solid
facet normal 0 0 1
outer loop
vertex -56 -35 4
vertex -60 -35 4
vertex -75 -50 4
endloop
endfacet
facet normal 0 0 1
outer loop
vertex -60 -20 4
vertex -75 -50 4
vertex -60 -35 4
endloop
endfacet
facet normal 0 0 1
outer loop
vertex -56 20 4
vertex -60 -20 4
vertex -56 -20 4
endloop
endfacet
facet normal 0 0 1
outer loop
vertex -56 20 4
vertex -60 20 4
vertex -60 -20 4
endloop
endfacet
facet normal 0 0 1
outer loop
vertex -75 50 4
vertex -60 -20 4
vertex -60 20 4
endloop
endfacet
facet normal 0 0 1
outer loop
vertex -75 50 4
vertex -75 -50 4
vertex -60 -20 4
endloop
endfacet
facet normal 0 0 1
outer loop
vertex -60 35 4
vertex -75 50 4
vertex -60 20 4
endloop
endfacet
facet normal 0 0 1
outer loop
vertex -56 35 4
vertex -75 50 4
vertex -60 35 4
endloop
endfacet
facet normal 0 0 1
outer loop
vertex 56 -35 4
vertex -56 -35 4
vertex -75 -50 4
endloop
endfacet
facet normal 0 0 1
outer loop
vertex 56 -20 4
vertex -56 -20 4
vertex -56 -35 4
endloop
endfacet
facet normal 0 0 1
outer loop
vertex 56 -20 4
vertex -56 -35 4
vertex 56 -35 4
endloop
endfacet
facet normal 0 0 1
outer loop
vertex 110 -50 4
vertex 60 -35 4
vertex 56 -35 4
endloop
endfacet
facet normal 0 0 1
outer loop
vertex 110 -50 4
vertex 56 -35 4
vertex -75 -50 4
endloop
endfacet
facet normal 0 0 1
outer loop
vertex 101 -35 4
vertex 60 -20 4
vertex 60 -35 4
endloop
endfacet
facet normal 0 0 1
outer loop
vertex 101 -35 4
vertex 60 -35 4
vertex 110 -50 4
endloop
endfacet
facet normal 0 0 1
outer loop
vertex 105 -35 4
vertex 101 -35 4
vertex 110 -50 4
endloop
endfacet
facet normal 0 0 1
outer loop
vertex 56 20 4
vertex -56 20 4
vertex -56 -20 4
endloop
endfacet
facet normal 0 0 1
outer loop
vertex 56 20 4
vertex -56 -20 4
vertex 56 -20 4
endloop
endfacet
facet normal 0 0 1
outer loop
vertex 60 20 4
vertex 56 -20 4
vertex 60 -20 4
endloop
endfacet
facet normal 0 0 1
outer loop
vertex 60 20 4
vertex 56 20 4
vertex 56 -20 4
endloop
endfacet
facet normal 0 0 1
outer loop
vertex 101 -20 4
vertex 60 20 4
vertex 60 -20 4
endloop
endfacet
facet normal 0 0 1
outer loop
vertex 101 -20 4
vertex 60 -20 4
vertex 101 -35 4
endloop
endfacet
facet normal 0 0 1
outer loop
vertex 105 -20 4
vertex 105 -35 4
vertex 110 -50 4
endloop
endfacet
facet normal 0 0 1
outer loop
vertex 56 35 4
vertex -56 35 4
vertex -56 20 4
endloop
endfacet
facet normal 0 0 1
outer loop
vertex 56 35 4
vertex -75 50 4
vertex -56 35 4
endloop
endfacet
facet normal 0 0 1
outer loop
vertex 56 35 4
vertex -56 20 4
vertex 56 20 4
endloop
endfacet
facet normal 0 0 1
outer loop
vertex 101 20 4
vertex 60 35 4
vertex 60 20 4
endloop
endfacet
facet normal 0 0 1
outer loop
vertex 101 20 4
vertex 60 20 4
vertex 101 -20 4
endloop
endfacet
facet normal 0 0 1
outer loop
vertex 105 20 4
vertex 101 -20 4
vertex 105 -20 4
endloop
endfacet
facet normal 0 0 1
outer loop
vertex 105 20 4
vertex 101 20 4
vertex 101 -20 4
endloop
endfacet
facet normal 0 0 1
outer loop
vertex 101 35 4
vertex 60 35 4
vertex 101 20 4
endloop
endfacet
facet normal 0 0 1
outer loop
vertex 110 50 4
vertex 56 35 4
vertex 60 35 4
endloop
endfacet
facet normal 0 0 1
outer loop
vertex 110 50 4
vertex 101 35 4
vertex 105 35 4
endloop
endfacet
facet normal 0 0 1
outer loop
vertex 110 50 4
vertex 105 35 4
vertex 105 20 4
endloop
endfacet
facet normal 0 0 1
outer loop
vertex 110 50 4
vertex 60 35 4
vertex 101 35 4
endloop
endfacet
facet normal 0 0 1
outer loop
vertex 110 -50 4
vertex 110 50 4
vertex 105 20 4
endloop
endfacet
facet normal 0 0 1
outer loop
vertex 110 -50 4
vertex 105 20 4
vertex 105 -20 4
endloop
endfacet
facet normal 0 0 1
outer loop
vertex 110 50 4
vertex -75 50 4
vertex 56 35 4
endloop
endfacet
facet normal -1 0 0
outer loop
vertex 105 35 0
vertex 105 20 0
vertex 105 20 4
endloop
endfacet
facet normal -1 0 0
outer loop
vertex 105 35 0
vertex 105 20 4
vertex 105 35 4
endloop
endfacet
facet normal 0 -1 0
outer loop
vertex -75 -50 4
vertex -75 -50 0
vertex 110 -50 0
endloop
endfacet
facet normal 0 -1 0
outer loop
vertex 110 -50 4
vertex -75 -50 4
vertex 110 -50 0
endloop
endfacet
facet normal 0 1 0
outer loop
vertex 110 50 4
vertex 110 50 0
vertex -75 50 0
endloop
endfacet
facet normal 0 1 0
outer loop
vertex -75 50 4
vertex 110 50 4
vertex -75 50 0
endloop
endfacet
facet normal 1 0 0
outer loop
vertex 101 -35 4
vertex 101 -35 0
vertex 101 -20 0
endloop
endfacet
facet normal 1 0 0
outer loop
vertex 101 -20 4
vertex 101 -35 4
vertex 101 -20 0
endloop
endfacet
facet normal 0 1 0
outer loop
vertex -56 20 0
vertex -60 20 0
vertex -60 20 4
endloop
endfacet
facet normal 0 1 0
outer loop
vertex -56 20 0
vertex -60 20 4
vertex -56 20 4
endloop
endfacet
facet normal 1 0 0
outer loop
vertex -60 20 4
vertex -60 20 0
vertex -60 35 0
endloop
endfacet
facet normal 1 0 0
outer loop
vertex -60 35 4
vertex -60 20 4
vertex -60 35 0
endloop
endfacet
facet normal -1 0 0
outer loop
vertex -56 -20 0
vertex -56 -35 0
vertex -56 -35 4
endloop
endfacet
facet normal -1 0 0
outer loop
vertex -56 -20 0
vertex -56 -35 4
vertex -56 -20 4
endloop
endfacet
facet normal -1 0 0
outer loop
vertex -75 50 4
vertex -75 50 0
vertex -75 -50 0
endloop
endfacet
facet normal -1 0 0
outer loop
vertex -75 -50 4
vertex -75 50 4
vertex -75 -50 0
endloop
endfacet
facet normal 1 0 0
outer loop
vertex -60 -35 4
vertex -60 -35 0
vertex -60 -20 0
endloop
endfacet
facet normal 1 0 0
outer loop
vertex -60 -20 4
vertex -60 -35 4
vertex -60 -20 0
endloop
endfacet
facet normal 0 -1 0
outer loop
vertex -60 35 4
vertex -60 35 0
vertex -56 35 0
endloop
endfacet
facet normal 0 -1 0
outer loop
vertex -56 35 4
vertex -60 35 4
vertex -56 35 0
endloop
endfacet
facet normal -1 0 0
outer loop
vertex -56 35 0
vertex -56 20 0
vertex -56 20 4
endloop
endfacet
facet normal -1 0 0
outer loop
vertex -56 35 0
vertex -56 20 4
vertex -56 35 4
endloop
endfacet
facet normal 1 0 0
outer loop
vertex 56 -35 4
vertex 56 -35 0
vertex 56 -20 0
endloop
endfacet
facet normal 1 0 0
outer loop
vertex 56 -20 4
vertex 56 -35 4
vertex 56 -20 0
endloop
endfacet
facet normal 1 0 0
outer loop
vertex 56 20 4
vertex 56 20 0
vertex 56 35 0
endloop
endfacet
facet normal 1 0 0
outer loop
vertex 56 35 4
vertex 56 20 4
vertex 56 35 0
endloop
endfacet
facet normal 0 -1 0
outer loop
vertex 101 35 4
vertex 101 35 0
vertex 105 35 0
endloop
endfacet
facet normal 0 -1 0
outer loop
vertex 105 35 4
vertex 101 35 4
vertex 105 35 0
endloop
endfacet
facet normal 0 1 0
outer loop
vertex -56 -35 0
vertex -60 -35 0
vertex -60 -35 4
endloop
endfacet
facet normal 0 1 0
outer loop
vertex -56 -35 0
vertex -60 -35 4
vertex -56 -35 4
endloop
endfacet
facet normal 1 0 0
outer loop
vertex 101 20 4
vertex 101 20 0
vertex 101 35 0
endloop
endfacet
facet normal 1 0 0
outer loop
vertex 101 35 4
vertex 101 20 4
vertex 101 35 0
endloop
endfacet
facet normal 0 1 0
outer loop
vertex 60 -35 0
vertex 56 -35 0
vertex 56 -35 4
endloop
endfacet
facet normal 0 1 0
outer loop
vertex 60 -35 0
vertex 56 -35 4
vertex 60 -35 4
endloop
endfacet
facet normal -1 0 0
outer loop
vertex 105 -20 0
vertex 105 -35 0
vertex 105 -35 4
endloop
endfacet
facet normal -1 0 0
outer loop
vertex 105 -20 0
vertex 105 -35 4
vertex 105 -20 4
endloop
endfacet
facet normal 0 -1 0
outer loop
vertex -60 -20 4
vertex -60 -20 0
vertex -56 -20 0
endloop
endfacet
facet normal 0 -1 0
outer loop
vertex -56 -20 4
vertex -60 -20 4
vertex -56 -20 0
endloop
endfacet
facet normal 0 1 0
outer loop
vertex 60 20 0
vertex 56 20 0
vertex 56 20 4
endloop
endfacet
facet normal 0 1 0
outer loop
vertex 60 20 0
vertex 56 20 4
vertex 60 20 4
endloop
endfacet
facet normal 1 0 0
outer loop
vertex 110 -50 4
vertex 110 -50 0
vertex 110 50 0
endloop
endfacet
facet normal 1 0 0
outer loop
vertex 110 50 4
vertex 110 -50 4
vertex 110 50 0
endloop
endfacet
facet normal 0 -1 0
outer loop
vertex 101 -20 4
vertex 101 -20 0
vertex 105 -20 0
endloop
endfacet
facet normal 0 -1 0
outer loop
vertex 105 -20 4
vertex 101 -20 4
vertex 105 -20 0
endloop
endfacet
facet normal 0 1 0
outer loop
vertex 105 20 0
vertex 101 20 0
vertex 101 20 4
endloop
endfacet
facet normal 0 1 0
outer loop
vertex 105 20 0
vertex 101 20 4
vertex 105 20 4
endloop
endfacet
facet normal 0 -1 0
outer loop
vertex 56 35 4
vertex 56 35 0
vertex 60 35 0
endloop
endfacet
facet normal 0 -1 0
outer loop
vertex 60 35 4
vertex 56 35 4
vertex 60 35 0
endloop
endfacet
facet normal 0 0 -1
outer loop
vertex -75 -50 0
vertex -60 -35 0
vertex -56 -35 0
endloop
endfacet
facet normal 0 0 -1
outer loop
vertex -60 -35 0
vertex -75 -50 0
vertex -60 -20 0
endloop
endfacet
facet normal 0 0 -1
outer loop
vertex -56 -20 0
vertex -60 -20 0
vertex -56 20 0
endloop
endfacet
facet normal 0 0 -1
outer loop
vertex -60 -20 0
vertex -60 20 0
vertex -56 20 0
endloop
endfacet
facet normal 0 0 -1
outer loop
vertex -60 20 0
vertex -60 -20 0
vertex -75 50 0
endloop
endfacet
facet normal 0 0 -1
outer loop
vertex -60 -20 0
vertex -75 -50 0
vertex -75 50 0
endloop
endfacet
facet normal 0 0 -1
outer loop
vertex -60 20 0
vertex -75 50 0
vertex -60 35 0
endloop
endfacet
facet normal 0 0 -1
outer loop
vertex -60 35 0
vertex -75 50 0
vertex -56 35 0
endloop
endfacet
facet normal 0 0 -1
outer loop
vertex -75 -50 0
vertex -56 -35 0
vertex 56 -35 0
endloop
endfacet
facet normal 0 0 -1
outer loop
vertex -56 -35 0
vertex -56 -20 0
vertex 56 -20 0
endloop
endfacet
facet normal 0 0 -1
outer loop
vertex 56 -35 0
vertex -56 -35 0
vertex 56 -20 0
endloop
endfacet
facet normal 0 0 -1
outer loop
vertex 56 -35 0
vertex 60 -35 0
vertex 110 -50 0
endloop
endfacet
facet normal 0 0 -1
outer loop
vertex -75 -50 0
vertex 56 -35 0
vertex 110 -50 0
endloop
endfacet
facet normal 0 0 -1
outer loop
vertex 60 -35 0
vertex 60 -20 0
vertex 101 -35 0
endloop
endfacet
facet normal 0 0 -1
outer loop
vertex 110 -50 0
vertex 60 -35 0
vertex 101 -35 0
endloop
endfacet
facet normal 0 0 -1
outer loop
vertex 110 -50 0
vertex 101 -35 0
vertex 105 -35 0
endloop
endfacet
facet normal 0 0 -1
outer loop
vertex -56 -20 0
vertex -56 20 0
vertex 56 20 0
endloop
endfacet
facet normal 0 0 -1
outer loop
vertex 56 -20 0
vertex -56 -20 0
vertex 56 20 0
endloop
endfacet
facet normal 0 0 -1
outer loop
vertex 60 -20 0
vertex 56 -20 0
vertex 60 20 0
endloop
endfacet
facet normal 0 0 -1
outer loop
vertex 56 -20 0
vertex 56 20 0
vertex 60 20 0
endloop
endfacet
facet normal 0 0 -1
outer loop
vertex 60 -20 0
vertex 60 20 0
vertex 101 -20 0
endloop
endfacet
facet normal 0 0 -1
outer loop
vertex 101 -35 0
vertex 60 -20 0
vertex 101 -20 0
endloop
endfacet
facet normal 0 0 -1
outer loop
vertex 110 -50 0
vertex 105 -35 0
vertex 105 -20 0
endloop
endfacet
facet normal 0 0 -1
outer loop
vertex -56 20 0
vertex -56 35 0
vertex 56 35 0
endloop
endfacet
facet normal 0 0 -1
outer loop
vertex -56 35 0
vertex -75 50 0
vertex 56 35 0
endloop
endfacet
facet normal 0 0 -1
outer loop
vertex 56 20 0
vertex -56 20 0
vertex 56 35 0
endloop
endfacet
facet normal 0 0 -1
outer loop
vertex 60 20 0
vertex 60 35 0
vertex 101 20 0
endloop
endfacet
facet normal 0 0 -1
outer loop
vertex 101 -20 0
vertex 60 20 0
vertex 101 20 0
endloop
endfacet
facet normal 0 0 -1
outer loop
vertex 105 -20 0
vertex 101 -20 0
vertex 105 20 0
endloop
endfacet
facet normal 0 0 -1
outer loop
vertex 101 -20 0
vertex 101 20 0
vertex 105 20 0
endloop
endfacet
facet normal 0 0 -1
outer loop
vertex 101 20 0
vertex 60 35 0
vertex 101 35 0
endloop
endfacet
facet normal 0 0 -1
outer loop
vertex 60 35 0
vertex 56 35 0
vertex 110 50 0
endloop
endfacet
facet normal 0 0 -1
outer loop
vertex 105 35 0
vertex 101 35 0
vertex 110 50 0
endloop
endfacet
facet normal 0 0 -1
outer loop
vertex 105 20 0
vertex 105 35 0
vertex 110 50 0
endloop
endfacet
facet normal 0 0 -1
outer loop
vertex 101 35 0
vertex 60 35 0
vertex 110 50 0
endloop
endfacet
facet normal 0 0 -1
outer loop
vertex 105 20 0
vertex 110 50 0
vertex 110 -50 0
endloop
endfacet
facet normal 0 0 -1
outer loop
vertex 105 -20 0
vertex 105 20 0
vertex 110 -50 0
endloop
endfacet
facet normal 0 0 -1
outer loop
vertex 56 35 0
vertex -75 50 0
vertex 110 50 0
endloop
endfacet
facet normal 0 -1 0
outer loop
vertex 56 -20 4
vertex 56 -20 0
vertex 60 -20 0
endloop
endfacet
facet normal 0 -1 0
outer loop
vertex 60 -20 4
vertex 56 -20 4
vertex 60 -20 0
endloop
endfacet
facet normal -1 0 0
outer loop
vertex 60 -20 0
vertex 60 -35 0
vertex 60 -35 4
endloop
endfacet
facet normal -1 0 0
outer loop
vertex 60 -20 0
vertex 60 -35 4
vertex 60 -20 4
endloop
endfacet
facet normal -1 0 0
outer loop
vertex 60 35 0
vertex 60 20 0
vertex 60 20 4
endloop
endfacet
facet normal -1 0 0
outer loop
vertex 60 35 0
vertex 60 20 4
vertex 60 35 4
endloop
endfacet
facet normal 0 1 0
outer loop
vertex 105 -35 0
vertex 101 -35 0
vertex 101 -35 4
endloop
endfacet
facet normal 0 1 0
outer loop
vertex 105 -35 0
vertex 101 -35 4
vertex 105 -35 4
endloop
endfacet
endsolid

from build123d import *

# Parameters (mm, degrees)
SKETCH1_W           = 4
SKETCH1_H           = 15
BOSS_EXTRUDE1_DEPTH = 4


with BuildPart() as part:
    # Sketch1 → Boss-Extrude1 (new body)
    with BuildSketch(Plane.XY):
        Polygon((-75, -50), (75, -50), (110, -50), (110, 50), (75, 50), (-75, 50), align=None)
        with Locations((58, 27.5)):
            Rectangle(SKETCH1_W, SKETCH1_H, mode=Mode.SUBTRACT)
        with Locations((58, -27.5)):
            Rectangle(SKETCH1_W, SKETCH1_H, mode=Mode.SUBTRACT)
        with Locations((-58, 27.5)):
            Rectangle(SKETCH1_W, SKETCH1_H, mode=Mode.SUBTRACT)
        with Locations((-58, -27.5)):
            Rectangle(SKETCH1_W, SKETCH1_H, mode=Mode.SUBTRACT)
        with Locations((103, 27.5)):
            Rectangle(SKETCH1_W, SKETCH1_H, mode=Mode.SUBTRACT)
        with Locations((103, -27.5)):
            Rectangle(SKETCH1_W, SKETCH1_H, mode=Mode.SUBTRACT)
    extrude(amount=BOSS_EXTRUDE1_DEPTH)


solid = part.part
